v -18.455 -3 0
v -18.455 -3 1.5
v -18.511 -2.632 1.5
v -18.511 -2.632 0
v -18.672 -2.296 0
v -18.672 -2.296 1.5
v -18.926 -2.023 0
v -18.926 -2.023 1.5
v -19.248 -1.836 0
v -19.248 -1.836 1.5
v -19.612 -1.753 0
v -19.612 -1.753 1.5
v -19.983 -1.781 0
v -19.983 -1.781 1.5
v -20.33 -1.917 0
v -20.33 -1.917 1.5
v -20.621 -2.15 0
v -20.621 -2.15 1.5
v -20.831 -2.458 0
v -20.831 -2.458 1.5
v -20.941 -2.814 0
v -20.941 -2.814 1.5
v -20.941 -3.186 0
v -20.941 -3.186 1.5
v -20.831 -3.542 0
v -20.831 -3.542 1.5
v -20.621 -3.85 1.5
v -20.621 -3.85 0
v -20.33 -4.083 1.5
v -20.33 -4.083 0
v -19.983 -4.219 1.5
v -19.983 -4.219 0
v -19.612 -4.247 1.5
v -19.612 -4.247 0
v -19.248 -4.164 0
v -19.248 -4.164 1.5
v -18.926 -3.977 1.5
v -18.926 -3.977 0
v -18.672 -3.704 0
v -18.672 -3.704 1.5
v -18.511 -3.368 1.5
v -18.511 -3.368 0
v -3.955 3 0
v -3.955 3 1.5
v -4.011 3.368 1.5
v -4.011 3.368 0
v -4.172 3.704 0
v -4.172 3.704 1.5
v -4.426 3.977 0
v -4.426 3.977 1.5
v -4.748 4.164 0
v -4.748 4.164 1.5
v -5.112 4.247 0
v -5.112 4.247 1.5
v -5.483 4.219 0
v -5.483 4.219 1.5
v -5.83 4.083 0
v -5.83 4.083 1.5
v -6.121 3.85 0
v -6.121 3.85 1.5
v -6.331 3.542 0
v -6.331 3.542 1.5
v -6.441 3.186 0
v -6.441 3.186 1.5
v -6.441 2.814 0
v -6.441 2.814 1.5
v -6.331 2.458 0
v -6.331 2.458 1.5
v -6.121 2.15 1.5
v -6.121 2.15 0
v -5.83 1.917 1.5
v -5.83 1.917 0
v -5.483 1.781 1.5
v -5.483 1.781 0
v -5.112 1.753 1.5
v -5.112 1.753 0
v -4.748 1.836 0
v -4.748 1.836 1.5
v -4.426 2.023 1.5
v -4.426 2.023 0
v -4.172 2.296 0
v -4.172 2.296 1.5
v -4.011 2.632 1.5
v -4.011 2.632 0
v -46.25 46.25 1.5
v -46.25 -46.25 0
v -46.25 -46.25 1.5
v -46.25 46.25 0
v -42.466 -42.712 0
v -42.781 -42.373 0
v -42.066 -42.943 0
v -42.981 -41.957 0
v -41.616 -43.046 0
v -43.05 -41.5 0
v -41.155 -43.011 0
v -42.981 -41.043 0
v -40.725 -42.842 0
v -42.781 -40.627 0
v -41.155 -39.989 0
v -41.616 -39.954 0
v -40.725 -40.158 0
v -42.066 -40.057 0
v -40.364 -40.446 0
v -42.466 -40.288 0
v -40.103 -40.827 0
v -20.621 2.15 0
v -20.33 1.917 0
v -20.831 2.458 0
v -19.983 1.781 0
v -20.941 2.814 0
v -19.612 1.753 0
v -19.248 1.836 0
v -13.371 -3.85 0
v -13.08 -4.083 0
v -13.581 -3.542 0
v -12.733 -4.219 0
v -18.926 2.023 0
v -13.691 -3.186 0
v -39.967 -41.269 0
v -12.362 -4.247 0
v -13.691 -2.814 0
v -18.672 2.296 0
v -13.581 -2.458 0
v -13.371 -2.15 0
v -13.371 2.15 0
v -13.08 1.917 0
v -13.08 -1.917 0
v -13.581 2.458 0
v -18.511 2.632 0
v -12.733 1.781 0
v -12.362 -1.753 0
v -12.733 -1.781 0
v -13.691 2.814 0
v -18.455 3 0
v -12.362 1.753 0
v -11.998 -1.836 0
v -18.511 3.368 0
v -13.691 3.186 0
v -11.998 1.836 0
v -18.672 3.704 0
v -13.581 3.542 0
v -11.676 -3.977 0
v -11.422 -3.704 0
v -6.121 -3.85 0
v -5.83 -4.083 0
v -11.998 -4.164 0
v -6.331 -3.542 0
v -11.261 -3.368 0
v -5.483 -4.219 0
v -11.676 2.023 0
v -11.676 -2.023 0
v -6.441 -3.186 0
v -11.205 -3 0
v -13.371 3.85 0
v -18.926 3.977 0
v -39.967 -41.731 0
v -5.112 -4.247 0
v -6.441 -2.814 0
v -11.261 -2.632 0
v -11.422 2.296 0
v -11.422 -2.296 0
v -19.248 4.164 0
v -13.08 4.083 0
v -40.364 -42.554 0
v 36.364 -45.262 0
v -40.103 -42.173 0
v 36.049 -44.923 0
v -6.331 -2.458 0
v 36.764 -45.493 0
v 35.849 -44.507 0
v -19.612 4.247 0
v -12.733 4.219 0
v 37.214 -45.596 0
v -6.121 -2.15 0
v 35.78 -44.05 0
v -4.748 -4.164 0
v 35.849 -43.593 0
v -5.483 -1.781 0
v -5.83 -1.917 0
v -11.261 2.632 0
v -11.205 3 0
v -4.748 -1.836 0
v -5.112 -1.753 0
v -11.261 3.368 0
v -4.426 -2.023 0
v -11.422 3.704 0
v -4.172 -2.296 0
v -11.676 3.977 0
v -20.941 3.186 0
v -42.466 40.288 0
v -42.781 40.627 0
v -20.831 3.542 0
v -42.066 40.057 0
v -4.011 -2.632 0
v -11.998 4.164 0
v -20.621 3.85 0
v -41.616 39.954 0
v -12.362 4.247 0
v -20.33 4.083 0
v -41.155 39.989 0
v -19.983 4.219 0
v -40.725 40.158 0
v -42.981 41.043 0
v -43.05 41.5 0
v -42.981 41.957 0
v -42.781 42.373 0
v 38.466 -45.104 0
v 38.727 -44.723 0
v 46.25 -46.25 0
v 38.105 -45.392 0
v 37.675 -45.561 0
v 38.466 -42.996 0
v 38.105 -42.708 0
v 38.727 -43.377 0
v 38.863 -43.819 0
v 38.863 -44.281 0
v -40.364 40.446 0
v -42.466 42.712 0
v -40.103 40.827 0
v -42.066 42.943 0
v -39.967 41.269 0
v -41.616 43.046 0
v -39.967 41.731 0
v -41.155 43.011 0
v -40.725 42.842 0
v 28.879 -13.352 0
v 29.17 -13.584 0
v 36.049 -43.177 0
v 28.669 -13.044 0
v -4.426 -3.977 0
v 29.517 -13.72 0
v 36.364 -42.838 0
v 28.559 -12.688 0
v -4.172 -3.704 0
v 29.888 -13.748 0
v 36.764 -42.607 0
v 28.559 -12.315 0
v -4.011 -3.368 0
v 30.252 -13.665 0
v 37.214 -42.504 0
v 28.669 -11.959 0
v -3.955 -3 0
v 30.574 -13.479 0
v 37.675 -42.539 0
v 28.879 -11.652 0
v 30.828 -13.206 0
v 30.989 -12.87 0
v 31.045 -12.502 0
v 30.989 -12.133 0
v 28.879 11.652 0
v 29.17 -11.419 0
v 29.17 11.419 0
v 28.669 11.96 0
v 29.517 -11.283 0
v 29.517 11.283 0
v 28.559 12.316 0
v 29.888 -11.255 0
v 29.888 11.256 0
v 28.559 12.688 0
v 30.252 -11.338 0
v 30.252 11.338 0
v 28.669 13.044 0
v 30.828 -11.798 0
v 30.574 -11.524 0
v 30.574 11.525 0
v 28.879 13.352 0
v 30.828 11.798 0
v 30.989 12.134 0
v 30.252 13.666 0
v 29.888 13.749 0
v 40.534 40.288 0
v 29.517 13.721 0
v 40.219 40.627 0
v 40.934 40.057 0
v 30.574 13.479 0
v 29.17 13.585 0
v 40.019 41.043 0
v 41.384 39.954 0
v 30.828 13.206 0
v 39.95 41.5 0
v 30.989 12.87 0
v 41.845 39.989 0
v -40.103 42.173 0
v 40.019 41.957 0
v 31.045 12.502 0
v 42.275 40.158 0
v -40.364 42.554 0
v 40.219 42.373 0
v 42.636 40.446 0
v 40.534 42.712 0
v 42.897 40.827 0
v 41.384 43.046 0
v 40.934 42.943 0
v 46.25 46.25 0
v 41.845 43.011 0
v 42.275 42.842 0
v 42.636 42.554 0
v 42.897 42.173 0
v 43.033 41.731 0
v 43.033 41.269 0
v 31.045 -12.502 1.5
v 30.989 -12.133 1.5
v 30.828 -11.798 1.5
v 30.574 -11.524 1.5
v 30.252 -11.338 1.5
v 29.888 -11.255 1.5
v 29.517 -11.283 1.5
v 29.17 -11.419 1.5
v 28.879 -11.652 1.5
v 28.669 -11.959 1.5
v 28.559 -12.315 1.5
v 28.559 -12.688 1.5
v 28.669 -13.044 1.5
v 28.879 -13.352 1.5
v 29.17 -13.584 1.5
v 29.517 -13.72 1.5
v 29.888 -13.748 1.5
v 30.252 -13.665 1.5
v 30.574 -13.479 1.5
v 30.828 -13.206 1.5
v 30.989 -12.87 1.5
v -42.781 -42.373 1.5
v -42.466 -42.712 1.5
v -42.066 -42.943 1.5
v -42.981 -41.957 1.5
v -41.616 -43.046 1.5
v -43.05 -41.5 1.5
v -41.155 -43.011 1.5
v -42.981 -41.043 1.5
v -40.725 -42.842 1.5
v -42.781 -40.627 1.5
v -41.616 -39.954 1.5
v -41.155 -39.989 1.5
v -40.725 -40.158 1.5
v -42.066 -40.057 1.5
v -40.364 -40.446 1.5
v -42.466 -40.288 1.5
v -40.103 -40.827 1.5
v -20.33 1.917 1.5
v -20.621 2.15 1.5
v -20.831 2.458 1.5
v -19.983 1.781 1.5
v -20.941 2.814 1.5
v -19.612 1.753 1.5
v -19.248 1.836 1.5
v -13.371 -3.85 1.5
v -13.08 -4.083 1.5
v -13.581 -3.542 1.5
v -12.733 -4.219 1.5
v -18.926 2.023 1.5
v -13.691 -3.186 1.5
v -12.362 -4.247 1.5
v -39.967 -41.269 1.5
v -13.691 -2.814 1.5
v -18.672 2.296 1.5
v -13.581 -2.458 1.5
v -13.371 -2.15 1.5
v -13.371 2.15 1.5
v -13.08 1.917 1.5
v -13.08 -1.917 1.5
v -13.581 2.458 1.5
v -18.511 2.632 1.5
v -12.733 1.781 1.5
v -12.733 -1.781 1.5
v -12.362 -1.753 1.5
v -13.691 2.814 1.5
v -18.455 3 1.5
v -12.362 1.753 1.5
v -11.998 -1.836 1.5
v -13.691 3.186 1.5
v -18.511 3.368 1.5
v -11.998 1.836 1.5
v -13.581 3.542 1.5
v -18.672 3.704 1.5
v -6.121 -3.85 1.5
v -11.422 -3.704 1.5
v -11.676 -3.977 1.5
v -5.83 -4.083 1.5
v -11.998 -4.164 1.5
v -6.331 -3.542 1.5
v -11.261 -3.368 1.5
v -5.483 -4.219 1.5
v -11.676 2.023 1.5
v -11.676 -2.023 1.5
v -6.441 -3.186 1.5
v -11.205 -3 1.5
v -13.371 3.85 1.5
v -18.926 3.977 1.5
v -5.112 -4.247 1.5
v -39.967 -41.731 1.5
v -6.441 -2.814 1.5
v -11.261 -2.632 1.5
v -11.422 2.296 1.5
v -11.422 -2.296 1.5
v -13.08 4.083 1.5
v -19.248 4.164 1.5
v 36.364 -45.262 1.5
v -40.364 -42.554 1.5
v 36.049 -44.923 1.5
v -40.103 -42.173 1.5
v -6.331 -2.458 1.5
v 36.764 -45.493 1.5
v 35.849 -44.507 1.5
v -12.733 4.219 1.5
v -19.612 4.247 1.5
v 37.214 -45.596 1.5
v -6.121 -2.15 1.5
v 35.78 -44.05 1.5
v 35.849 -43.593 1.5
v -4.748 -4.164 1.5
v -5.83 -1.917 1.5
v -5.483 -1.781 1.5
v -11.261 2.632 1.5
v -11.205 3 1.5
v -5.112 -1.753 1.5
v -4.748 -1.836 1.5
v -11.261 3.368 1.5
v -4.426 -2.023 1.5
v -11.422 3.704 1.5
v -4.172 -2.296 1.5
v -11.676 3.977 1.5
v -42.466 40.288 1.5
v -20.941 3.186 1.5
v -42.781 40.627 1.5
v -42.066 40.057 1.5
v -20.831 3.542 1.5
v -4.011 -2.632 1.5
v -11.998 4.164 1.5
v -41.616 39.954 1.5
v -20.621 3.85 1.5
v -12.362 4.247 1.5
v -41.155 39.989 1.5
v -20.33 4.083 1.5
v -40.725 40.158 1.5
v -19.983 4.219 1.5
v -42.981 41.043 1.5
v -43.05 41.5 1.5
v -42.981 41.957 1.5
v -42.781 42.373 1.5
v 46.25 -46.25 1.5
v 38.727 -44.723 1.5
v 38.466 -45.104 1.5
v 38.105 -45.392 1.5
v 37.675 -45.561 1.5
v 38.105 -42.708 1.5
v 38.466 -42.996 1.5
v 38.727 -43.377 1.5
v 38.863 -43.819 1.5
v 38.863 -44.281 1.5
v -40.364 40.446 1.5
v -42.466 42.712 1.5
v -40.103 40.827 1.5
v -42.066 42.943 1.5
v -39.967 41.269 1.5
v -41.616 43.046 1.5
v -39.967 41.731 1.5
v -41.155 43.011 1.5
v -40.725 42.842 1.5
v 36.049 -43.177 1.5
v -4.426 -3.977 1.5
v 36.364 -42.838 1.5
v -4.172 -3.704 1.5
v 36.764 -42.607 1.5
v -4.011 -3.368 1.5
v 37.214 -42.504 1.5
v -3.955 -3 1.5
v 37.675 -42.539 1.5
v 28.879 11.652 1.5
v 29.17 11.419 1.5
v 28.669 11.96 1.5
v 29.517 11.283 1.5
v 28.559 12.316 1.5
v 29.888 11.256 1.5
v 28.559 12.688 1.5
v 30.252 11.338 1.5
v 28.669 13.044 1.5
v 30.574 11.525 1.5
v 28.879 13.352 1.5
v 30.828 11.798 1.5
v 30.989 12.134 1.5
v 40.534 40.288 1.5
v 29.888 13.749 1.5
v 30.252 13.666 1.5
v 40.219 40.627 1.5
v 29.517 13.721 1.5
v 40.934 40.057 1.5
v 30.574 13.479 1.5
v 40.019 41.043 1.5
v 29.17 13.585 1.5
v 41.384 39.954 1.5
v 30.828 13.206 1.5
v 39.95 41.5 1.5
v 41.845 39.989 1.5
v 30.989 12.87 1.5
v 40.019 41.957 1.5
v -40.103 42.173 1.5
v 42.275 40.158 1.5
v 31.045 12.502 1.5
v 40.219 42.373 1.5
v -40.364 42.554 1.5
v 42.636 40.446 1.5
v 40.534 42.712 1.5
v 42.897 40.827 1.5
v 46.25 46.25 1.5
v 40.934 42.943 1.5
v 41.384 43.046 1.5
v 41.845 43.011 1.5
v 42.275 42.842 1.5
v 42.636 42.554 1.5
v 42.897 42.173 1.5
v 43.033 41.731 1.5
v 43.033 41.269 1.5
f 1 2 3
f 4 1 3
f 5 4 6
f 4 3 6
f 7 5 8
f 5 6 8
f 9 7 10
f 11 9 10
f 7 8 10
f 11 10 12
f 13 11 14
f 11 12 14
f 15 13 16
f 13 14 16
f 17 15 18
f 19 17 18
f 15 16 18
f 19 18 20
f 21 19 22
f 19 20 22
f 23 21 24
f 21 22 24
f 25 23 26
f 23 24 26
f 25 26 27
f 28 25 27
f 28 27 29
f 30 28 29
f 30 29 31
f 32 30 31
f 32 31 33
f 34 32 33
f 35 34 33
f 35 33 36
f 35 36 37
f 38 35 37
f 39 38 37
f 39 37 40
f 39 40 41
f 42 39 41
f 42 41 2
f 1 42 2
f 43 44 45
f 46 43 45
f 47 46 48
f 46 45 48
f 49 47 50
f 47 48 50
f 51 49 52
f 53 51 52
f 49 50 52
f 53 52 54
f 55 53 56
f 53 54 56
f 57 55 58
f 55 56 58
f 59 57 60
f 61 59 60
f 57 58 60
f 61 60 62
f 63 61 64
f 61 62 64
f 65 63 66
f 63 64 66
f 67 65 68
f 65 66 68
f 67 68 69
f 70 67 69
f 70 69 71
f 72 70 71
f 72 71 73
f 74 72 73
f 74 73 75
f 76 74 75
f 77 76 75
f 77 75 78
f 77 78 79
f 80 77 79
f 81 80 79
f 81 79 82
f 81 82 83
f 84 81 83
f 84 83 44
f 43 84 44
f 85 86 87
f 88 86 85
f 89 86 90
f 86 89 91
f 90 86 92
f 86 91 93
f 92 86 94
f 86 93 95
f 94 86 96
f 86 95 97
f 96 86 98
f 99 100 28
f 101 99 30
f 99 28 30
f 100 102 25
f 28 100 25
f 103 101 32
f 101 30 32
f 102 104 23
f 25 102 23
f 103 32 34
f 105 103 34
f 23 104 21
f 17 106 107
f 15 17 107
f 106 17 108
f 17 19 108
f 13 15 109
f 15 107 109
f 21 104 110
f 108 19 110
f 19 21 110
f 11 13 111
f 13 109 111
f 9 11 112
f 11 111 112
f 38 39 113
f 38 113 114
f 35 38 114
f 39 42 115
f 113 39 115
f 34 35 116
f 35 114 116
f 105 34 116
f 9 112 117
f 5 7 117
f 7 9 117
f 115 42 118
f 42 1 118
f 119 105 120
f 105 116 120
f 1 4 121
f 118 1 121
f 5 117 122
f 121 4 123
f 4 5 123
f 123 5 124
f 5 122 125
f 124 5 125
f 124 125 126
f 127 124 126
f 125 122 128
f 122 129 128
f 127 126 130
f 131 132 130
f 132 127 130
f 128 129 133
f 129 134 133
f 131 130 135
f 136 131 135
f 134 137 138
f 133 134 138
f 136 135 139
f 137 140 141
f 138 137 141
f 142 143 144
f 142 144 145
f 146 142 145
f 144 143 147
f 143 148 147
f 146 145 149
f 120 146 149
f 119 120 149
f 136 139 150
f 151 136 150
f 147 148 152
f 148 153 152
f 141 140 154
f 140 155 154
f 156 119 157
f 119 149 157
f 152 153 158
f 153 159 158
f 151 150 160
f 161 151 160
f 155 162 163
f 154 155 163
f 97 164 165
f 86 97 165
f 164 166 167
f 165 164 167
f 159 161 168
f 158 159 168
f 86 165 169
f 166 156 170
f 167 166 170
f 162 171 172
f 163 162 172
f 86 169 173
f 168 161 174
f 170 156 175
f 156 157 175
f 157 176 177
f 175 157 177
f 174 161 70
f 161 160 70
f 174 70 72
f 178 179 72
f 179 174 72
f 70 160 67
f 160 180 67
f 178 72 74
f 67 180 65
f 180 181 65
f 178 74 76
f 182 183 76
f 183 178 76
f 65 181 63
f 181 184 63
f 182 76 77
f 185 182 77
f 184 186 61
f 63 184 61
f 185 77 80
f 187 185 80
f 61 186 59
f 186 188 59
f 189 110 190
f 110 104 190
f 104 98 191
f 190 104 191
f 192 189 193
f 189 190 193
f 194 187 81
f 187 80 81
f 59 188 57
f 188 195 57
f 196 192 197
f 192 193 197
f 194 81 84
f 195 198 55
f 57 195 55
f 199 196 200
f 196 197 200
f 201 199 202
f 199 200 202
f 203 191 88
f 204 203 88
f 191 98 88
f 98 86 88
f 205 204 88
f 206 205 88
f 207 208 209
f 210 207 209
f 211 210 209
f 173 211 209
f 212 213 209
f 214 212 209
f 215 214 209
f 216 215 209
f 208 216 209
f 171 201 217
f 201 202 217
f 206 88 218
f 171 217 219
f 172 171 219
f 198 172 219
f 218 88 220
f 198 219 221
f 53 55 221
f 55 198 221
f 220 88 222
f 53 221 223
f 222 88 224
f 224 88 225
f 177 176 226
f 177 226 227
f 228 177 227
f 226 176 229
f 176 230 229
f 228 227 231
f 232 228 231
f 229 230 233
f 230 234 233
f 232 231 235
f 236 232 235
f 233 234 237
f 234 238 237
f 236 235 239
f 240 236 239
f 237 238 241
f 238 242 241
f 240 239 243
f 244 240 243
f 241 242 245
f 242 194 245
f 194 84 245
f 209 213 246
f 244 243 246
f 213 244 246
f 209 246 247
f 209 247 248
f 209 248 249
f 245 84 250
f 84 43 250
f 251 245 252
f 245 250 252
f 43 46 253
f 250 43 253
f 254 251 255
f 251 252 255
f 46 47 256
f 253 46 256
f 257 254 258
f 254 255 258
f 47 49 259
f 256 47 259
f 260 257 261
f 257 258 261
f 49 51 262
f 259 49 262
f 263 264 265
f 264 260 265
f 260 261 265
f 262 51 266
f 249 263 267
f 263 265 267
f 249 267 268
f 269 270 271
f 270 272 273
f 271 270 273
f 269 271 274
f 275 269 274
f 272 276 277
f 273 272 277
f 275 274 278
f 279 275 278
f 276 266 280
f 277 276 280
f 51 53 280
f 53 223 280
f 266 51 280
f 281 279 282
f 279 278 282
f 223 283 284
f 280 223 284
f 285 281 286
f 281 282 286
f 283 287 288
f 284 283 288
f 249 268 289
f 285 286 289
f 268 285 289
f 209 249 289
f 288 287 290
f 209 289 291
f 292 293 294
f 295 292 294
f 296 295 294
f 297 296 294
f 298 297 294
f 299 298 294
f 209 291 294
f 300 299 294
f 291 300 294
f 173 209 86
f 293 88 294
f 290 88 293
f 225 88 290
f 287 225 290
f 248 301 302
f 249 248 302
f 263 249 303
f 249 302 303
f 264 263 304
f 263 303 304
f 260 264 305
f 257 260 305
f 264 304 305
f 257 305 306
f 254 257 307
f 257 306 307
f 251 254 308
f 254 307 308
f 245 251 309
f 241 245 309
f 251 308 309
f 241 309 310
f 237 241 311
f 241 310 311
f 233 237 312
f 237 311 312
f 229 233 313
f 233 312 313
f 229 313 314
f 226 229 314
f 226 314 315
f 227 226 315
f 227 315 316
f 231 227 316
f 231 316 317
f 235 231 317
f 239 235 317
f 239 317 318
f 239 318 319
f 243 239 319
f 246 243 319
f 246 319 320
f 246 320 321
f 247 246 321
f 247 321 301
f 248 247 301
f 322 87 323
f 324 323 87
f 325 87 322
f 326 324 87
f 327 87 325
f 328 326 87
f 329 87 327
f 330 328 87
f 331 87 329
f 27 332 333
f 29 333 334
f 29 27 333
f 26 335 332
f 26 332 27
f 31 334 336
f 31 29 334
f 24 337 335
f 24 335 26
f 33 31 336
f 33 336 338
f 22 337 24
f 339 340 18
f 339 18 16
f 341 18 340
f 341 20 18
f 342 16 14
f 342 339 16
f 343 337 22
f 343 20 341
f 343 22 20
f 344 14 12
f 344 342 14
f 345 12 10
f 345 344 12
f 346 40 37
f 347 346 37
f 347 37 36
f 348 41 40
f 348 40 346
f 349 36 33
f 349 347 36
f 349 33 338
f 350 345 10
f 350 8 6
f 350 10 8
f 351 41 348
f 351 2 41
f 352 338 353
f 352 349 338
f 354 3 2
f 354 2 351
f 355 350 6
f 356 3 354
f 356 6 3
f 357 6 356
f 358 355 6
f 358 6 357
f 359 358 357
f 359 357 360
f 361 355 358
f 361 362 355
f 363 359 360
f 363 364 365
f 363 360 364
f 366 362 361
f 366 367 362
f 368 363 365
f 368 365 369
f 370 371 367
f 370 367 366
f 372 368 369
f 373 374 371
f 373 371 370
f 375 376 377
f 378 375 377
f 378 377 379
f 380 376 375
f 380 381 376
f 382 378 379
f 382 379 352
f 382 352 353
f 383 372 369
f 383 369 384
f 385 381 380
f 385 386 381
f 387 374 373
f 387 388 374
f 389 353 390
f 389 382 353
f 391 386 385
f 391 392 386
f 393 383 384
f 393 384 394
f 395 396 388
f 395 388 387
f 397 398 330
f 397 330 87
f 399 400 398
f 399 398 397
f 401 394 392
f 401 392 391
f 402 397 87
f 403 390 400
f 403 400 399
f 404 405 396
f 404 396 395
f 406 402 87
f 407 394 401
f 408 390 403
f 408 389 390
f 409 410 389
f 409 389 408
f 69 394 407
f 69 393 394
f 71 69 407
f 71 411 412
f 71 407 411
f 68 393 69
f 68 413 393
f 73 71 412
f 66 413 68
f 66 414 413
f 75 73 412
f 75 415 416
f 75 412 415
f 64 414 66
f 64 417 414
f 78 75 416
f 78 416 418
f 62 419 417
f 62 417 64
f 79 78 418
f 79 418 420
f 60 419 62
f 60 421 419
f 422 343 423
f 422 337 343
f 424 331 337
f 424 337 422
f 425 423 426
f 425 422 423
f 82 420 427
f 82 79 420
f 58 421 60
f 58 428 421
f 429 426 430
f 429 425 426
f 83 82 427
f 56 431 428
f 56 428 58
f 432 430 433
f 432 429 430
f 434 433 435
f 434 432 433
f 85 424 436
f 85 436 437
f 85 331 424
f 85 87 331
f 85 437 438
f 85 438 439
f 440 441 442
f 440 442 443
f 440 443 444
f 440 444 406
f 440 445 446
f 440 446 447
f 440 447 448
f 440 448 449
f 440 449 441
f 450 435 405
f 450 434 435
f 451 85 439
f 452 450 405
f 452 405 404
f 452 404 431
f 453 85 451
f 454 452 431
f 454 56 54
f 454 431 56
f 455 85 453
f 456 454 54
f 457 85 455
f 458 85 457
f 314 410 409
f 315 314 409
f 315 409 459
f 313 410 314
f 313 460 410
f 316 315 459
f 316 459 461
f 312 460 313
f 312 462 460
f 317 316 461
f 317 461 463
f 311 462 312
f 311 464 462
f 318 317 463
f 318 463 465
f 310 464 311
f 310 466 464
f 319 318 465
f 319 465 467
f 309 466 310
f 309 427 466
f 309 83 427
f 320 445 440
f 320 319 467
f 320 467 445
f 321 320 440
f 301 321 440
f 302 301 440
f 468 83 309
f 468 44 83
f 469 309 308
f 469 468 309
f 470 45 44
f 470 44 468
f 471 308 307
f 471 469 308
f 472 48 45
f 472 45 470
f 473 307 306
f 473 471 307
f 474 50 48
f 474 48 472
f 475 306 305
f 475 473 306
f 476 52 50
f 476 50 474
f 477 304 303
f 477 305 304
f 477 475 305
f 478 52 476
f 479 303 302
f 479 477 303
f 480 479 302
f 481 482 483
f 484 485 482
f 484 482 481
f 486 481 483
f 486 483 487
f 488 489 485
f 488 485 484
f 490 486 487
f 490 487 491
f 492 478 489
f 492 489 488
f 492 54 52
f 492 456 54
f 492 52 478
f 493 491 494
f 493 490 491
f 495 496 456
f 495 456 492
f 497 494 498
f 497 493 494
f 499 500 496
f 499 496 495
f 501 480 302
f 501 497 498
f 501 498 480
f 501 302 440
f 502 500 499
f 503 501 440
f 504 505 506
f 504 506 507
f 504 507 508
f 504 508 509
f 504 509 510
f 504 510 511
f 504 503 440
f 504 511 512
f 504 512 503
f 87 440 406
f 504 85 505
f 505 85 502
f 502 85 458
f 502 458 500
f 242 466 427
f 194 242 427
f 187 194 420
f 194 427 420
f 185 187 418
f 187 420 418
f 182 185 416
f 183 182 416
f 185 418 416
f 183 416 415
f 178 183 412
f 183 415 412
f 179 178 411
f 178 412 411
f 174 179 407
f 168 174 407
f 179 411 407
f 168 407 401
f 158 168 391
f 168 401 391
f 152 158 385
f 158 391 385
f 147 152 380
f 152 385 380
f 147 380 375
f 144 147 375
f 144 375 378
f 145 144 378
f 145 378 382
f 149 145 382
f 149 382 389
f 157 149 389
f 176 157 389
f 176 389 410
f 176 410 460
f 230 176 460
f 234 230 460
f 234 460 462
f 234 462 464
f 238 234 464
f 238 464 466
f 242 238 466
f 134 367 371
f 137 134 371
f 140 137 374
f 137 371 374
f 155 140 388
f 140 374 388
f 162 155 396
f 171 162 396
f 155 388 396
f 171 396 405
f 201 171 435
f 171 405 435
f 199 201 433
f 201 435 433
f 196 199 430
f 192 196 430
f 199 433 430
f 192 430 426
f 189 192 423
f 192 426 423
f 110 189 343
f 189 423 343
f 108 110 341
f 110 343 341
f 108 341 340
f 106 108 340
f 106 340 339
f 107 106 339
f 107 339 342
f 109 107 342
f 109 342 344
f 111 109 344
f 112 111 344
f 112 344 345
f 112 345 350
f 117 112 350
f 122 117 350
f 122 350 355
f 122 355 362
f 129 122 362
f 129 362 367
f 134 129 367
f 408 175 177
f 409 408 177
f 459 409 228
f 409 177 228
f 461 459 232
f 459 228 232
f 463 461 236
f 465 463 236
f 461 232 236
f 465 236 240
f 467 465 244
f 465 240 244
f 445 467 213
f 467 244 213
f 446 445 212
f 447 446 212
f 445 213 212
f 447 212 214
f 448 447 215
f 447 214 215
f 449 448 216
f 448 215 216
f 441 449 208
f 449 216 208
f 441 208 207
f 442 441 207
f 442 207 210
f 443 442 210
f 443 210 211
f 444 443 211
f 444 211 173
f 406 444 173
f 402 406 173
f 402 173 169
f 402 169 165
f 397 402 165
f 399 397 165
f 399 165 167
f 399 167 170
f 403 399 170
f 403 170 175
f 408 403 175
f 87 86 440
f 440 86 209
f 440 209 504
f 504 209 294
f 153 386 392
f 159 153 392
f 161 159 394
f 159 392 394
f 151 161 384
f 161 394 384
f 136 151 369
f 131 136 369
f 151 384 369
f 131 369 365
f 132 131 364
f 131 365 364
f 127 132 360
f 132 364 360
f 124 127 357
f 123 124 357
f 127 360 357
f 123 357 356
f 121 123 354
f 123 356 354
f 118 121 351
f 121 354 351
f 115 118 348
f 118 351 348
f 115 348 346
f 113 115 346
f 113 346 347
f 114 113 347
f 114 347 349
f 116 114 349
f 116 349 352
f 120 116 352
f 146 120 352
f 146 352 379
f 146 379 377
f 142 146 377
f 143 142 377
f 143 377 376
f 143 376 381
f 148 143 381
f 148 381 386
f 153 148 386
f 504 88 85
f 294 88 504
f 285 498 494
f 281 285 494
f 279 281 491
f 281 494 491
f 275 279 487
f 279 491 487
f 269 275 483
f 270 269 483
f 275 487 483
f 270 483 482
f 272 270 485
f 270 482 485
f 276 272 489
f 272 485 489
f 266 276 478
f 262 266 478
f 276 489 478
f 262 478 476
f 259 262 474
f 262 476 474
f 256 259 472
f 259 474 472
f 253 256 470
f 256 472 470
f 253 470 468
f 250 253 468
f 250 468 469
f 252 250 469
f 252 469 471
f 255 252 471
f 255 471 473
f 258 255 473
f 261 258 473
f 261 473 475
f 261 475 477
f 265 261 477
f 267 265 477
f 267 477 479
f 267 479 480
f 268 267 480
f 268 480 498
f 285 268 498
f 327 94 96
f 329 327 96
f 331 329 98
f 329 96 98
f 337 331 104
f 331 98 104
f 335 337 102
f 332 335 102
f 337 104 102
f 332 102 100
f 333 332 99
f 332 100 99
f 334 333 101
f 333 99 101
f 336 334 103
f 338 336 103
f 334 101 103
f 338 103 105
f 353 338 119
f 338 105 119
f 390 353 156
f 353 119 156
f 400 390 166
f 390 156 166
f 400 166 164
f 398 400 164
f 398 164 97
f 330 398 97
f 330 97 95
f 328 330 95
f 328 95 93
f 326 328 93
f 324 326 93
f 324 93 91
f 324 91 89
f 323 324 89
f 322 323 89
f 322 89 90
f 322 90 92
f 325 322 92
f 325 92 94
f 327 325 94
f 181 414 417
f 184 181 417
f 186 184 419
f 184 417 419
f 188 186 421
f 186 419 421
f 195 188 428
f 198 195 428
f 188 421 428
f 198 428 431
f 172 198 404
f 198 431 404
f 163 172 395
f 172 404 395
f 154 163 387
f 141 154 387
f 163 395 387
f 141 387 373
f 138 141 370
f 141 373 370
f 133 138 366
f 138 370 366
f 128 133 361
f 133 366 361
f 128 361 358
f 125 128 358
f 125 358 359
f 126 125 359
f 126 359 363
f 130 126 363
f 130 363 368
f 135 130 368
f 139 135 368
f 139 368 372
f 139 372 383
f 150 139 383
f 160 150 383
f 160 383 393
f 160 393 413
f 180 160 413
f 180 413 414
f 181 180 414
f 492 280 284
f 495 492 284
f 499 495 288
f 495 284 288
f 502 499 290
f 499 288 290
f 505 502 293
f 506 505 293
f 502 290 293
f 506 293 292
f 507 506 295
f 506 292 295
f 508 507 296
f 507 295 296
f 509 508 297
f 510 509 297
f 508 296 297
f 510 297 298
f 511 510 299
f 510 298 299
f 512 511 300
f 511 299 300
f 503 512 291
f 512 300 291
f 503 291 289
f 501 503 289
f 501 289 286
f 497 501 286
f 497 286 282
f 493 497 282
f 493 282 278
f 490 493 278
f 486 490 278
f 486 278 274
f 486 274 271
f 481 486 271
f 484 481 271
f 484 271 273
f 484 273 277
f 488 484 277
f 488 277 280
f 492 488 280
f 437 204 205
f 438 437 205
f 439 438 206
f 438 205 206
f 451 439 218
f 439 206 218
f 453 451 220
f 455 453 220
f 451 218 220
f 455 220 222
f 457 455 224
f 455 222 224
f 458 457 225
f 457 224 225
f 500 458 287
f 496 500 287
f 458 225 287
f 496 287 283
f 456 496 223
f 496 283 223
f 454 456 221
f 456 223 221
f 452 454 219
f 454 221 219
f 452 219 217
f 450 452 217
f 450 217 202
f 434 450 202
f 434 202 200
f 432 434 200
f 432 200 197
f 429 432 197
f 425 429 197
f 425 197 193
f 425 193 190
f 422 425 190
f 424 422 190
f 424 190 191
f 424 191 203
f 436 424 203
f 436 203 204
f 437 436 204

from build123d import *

# Parameters (mm, degrees)
SKETCH1_W                  = 92.5
SKETCH1_H                  = 92.5
BOSS_EXTRUDE1_DEPTH        = 1.5
F_3_1_3_1_DIAMETER_HOLE1_D = 3.1
F_2_5_2_5_DIAMETER_HOLE1_D = 2.5


with BuildPart() as part:
    # Sketch1 → Boss-Extrude1 (new body)
    with BuildSketch(Plane.XY):
        Rectangle(SKETCH1_W, SKETCH1_H)
    extrude(amount=BOSS_EXTRUDE1_DEPTH)

    # Ø3.1 (3.1) Diameter Hole1 (through all)
    with Locations(Plane.XY.offset(1.5)):
        with Locations((-41.5, 41.5), (41.5, 41.5), (37.33, -44.05), (-41.5, -41.5)):
            Hole(F_3_1_3_1_DIAMETER_HOLE1_D / 2)

    # Ø2.5 (2.5) Diameter Hole1 (through all)
    with Locations(Plane(origin=(0, 0, 0), x_dir=(-1, 0, 0), z_dir=(0, 0, -1))):
        with Locations((19.704975955, 3), (19.704975955, -3), (12.454975955, -3), (12.454975955, 3), (5.204975955, 3), (5.204975955, -3), (-29.795024045, 12.502014748), (-29.795024045, -12.501777911)):
            Hole(F_2_5_2_5_DIAMETER_HOLE1_D / 2)


solid = part.part
